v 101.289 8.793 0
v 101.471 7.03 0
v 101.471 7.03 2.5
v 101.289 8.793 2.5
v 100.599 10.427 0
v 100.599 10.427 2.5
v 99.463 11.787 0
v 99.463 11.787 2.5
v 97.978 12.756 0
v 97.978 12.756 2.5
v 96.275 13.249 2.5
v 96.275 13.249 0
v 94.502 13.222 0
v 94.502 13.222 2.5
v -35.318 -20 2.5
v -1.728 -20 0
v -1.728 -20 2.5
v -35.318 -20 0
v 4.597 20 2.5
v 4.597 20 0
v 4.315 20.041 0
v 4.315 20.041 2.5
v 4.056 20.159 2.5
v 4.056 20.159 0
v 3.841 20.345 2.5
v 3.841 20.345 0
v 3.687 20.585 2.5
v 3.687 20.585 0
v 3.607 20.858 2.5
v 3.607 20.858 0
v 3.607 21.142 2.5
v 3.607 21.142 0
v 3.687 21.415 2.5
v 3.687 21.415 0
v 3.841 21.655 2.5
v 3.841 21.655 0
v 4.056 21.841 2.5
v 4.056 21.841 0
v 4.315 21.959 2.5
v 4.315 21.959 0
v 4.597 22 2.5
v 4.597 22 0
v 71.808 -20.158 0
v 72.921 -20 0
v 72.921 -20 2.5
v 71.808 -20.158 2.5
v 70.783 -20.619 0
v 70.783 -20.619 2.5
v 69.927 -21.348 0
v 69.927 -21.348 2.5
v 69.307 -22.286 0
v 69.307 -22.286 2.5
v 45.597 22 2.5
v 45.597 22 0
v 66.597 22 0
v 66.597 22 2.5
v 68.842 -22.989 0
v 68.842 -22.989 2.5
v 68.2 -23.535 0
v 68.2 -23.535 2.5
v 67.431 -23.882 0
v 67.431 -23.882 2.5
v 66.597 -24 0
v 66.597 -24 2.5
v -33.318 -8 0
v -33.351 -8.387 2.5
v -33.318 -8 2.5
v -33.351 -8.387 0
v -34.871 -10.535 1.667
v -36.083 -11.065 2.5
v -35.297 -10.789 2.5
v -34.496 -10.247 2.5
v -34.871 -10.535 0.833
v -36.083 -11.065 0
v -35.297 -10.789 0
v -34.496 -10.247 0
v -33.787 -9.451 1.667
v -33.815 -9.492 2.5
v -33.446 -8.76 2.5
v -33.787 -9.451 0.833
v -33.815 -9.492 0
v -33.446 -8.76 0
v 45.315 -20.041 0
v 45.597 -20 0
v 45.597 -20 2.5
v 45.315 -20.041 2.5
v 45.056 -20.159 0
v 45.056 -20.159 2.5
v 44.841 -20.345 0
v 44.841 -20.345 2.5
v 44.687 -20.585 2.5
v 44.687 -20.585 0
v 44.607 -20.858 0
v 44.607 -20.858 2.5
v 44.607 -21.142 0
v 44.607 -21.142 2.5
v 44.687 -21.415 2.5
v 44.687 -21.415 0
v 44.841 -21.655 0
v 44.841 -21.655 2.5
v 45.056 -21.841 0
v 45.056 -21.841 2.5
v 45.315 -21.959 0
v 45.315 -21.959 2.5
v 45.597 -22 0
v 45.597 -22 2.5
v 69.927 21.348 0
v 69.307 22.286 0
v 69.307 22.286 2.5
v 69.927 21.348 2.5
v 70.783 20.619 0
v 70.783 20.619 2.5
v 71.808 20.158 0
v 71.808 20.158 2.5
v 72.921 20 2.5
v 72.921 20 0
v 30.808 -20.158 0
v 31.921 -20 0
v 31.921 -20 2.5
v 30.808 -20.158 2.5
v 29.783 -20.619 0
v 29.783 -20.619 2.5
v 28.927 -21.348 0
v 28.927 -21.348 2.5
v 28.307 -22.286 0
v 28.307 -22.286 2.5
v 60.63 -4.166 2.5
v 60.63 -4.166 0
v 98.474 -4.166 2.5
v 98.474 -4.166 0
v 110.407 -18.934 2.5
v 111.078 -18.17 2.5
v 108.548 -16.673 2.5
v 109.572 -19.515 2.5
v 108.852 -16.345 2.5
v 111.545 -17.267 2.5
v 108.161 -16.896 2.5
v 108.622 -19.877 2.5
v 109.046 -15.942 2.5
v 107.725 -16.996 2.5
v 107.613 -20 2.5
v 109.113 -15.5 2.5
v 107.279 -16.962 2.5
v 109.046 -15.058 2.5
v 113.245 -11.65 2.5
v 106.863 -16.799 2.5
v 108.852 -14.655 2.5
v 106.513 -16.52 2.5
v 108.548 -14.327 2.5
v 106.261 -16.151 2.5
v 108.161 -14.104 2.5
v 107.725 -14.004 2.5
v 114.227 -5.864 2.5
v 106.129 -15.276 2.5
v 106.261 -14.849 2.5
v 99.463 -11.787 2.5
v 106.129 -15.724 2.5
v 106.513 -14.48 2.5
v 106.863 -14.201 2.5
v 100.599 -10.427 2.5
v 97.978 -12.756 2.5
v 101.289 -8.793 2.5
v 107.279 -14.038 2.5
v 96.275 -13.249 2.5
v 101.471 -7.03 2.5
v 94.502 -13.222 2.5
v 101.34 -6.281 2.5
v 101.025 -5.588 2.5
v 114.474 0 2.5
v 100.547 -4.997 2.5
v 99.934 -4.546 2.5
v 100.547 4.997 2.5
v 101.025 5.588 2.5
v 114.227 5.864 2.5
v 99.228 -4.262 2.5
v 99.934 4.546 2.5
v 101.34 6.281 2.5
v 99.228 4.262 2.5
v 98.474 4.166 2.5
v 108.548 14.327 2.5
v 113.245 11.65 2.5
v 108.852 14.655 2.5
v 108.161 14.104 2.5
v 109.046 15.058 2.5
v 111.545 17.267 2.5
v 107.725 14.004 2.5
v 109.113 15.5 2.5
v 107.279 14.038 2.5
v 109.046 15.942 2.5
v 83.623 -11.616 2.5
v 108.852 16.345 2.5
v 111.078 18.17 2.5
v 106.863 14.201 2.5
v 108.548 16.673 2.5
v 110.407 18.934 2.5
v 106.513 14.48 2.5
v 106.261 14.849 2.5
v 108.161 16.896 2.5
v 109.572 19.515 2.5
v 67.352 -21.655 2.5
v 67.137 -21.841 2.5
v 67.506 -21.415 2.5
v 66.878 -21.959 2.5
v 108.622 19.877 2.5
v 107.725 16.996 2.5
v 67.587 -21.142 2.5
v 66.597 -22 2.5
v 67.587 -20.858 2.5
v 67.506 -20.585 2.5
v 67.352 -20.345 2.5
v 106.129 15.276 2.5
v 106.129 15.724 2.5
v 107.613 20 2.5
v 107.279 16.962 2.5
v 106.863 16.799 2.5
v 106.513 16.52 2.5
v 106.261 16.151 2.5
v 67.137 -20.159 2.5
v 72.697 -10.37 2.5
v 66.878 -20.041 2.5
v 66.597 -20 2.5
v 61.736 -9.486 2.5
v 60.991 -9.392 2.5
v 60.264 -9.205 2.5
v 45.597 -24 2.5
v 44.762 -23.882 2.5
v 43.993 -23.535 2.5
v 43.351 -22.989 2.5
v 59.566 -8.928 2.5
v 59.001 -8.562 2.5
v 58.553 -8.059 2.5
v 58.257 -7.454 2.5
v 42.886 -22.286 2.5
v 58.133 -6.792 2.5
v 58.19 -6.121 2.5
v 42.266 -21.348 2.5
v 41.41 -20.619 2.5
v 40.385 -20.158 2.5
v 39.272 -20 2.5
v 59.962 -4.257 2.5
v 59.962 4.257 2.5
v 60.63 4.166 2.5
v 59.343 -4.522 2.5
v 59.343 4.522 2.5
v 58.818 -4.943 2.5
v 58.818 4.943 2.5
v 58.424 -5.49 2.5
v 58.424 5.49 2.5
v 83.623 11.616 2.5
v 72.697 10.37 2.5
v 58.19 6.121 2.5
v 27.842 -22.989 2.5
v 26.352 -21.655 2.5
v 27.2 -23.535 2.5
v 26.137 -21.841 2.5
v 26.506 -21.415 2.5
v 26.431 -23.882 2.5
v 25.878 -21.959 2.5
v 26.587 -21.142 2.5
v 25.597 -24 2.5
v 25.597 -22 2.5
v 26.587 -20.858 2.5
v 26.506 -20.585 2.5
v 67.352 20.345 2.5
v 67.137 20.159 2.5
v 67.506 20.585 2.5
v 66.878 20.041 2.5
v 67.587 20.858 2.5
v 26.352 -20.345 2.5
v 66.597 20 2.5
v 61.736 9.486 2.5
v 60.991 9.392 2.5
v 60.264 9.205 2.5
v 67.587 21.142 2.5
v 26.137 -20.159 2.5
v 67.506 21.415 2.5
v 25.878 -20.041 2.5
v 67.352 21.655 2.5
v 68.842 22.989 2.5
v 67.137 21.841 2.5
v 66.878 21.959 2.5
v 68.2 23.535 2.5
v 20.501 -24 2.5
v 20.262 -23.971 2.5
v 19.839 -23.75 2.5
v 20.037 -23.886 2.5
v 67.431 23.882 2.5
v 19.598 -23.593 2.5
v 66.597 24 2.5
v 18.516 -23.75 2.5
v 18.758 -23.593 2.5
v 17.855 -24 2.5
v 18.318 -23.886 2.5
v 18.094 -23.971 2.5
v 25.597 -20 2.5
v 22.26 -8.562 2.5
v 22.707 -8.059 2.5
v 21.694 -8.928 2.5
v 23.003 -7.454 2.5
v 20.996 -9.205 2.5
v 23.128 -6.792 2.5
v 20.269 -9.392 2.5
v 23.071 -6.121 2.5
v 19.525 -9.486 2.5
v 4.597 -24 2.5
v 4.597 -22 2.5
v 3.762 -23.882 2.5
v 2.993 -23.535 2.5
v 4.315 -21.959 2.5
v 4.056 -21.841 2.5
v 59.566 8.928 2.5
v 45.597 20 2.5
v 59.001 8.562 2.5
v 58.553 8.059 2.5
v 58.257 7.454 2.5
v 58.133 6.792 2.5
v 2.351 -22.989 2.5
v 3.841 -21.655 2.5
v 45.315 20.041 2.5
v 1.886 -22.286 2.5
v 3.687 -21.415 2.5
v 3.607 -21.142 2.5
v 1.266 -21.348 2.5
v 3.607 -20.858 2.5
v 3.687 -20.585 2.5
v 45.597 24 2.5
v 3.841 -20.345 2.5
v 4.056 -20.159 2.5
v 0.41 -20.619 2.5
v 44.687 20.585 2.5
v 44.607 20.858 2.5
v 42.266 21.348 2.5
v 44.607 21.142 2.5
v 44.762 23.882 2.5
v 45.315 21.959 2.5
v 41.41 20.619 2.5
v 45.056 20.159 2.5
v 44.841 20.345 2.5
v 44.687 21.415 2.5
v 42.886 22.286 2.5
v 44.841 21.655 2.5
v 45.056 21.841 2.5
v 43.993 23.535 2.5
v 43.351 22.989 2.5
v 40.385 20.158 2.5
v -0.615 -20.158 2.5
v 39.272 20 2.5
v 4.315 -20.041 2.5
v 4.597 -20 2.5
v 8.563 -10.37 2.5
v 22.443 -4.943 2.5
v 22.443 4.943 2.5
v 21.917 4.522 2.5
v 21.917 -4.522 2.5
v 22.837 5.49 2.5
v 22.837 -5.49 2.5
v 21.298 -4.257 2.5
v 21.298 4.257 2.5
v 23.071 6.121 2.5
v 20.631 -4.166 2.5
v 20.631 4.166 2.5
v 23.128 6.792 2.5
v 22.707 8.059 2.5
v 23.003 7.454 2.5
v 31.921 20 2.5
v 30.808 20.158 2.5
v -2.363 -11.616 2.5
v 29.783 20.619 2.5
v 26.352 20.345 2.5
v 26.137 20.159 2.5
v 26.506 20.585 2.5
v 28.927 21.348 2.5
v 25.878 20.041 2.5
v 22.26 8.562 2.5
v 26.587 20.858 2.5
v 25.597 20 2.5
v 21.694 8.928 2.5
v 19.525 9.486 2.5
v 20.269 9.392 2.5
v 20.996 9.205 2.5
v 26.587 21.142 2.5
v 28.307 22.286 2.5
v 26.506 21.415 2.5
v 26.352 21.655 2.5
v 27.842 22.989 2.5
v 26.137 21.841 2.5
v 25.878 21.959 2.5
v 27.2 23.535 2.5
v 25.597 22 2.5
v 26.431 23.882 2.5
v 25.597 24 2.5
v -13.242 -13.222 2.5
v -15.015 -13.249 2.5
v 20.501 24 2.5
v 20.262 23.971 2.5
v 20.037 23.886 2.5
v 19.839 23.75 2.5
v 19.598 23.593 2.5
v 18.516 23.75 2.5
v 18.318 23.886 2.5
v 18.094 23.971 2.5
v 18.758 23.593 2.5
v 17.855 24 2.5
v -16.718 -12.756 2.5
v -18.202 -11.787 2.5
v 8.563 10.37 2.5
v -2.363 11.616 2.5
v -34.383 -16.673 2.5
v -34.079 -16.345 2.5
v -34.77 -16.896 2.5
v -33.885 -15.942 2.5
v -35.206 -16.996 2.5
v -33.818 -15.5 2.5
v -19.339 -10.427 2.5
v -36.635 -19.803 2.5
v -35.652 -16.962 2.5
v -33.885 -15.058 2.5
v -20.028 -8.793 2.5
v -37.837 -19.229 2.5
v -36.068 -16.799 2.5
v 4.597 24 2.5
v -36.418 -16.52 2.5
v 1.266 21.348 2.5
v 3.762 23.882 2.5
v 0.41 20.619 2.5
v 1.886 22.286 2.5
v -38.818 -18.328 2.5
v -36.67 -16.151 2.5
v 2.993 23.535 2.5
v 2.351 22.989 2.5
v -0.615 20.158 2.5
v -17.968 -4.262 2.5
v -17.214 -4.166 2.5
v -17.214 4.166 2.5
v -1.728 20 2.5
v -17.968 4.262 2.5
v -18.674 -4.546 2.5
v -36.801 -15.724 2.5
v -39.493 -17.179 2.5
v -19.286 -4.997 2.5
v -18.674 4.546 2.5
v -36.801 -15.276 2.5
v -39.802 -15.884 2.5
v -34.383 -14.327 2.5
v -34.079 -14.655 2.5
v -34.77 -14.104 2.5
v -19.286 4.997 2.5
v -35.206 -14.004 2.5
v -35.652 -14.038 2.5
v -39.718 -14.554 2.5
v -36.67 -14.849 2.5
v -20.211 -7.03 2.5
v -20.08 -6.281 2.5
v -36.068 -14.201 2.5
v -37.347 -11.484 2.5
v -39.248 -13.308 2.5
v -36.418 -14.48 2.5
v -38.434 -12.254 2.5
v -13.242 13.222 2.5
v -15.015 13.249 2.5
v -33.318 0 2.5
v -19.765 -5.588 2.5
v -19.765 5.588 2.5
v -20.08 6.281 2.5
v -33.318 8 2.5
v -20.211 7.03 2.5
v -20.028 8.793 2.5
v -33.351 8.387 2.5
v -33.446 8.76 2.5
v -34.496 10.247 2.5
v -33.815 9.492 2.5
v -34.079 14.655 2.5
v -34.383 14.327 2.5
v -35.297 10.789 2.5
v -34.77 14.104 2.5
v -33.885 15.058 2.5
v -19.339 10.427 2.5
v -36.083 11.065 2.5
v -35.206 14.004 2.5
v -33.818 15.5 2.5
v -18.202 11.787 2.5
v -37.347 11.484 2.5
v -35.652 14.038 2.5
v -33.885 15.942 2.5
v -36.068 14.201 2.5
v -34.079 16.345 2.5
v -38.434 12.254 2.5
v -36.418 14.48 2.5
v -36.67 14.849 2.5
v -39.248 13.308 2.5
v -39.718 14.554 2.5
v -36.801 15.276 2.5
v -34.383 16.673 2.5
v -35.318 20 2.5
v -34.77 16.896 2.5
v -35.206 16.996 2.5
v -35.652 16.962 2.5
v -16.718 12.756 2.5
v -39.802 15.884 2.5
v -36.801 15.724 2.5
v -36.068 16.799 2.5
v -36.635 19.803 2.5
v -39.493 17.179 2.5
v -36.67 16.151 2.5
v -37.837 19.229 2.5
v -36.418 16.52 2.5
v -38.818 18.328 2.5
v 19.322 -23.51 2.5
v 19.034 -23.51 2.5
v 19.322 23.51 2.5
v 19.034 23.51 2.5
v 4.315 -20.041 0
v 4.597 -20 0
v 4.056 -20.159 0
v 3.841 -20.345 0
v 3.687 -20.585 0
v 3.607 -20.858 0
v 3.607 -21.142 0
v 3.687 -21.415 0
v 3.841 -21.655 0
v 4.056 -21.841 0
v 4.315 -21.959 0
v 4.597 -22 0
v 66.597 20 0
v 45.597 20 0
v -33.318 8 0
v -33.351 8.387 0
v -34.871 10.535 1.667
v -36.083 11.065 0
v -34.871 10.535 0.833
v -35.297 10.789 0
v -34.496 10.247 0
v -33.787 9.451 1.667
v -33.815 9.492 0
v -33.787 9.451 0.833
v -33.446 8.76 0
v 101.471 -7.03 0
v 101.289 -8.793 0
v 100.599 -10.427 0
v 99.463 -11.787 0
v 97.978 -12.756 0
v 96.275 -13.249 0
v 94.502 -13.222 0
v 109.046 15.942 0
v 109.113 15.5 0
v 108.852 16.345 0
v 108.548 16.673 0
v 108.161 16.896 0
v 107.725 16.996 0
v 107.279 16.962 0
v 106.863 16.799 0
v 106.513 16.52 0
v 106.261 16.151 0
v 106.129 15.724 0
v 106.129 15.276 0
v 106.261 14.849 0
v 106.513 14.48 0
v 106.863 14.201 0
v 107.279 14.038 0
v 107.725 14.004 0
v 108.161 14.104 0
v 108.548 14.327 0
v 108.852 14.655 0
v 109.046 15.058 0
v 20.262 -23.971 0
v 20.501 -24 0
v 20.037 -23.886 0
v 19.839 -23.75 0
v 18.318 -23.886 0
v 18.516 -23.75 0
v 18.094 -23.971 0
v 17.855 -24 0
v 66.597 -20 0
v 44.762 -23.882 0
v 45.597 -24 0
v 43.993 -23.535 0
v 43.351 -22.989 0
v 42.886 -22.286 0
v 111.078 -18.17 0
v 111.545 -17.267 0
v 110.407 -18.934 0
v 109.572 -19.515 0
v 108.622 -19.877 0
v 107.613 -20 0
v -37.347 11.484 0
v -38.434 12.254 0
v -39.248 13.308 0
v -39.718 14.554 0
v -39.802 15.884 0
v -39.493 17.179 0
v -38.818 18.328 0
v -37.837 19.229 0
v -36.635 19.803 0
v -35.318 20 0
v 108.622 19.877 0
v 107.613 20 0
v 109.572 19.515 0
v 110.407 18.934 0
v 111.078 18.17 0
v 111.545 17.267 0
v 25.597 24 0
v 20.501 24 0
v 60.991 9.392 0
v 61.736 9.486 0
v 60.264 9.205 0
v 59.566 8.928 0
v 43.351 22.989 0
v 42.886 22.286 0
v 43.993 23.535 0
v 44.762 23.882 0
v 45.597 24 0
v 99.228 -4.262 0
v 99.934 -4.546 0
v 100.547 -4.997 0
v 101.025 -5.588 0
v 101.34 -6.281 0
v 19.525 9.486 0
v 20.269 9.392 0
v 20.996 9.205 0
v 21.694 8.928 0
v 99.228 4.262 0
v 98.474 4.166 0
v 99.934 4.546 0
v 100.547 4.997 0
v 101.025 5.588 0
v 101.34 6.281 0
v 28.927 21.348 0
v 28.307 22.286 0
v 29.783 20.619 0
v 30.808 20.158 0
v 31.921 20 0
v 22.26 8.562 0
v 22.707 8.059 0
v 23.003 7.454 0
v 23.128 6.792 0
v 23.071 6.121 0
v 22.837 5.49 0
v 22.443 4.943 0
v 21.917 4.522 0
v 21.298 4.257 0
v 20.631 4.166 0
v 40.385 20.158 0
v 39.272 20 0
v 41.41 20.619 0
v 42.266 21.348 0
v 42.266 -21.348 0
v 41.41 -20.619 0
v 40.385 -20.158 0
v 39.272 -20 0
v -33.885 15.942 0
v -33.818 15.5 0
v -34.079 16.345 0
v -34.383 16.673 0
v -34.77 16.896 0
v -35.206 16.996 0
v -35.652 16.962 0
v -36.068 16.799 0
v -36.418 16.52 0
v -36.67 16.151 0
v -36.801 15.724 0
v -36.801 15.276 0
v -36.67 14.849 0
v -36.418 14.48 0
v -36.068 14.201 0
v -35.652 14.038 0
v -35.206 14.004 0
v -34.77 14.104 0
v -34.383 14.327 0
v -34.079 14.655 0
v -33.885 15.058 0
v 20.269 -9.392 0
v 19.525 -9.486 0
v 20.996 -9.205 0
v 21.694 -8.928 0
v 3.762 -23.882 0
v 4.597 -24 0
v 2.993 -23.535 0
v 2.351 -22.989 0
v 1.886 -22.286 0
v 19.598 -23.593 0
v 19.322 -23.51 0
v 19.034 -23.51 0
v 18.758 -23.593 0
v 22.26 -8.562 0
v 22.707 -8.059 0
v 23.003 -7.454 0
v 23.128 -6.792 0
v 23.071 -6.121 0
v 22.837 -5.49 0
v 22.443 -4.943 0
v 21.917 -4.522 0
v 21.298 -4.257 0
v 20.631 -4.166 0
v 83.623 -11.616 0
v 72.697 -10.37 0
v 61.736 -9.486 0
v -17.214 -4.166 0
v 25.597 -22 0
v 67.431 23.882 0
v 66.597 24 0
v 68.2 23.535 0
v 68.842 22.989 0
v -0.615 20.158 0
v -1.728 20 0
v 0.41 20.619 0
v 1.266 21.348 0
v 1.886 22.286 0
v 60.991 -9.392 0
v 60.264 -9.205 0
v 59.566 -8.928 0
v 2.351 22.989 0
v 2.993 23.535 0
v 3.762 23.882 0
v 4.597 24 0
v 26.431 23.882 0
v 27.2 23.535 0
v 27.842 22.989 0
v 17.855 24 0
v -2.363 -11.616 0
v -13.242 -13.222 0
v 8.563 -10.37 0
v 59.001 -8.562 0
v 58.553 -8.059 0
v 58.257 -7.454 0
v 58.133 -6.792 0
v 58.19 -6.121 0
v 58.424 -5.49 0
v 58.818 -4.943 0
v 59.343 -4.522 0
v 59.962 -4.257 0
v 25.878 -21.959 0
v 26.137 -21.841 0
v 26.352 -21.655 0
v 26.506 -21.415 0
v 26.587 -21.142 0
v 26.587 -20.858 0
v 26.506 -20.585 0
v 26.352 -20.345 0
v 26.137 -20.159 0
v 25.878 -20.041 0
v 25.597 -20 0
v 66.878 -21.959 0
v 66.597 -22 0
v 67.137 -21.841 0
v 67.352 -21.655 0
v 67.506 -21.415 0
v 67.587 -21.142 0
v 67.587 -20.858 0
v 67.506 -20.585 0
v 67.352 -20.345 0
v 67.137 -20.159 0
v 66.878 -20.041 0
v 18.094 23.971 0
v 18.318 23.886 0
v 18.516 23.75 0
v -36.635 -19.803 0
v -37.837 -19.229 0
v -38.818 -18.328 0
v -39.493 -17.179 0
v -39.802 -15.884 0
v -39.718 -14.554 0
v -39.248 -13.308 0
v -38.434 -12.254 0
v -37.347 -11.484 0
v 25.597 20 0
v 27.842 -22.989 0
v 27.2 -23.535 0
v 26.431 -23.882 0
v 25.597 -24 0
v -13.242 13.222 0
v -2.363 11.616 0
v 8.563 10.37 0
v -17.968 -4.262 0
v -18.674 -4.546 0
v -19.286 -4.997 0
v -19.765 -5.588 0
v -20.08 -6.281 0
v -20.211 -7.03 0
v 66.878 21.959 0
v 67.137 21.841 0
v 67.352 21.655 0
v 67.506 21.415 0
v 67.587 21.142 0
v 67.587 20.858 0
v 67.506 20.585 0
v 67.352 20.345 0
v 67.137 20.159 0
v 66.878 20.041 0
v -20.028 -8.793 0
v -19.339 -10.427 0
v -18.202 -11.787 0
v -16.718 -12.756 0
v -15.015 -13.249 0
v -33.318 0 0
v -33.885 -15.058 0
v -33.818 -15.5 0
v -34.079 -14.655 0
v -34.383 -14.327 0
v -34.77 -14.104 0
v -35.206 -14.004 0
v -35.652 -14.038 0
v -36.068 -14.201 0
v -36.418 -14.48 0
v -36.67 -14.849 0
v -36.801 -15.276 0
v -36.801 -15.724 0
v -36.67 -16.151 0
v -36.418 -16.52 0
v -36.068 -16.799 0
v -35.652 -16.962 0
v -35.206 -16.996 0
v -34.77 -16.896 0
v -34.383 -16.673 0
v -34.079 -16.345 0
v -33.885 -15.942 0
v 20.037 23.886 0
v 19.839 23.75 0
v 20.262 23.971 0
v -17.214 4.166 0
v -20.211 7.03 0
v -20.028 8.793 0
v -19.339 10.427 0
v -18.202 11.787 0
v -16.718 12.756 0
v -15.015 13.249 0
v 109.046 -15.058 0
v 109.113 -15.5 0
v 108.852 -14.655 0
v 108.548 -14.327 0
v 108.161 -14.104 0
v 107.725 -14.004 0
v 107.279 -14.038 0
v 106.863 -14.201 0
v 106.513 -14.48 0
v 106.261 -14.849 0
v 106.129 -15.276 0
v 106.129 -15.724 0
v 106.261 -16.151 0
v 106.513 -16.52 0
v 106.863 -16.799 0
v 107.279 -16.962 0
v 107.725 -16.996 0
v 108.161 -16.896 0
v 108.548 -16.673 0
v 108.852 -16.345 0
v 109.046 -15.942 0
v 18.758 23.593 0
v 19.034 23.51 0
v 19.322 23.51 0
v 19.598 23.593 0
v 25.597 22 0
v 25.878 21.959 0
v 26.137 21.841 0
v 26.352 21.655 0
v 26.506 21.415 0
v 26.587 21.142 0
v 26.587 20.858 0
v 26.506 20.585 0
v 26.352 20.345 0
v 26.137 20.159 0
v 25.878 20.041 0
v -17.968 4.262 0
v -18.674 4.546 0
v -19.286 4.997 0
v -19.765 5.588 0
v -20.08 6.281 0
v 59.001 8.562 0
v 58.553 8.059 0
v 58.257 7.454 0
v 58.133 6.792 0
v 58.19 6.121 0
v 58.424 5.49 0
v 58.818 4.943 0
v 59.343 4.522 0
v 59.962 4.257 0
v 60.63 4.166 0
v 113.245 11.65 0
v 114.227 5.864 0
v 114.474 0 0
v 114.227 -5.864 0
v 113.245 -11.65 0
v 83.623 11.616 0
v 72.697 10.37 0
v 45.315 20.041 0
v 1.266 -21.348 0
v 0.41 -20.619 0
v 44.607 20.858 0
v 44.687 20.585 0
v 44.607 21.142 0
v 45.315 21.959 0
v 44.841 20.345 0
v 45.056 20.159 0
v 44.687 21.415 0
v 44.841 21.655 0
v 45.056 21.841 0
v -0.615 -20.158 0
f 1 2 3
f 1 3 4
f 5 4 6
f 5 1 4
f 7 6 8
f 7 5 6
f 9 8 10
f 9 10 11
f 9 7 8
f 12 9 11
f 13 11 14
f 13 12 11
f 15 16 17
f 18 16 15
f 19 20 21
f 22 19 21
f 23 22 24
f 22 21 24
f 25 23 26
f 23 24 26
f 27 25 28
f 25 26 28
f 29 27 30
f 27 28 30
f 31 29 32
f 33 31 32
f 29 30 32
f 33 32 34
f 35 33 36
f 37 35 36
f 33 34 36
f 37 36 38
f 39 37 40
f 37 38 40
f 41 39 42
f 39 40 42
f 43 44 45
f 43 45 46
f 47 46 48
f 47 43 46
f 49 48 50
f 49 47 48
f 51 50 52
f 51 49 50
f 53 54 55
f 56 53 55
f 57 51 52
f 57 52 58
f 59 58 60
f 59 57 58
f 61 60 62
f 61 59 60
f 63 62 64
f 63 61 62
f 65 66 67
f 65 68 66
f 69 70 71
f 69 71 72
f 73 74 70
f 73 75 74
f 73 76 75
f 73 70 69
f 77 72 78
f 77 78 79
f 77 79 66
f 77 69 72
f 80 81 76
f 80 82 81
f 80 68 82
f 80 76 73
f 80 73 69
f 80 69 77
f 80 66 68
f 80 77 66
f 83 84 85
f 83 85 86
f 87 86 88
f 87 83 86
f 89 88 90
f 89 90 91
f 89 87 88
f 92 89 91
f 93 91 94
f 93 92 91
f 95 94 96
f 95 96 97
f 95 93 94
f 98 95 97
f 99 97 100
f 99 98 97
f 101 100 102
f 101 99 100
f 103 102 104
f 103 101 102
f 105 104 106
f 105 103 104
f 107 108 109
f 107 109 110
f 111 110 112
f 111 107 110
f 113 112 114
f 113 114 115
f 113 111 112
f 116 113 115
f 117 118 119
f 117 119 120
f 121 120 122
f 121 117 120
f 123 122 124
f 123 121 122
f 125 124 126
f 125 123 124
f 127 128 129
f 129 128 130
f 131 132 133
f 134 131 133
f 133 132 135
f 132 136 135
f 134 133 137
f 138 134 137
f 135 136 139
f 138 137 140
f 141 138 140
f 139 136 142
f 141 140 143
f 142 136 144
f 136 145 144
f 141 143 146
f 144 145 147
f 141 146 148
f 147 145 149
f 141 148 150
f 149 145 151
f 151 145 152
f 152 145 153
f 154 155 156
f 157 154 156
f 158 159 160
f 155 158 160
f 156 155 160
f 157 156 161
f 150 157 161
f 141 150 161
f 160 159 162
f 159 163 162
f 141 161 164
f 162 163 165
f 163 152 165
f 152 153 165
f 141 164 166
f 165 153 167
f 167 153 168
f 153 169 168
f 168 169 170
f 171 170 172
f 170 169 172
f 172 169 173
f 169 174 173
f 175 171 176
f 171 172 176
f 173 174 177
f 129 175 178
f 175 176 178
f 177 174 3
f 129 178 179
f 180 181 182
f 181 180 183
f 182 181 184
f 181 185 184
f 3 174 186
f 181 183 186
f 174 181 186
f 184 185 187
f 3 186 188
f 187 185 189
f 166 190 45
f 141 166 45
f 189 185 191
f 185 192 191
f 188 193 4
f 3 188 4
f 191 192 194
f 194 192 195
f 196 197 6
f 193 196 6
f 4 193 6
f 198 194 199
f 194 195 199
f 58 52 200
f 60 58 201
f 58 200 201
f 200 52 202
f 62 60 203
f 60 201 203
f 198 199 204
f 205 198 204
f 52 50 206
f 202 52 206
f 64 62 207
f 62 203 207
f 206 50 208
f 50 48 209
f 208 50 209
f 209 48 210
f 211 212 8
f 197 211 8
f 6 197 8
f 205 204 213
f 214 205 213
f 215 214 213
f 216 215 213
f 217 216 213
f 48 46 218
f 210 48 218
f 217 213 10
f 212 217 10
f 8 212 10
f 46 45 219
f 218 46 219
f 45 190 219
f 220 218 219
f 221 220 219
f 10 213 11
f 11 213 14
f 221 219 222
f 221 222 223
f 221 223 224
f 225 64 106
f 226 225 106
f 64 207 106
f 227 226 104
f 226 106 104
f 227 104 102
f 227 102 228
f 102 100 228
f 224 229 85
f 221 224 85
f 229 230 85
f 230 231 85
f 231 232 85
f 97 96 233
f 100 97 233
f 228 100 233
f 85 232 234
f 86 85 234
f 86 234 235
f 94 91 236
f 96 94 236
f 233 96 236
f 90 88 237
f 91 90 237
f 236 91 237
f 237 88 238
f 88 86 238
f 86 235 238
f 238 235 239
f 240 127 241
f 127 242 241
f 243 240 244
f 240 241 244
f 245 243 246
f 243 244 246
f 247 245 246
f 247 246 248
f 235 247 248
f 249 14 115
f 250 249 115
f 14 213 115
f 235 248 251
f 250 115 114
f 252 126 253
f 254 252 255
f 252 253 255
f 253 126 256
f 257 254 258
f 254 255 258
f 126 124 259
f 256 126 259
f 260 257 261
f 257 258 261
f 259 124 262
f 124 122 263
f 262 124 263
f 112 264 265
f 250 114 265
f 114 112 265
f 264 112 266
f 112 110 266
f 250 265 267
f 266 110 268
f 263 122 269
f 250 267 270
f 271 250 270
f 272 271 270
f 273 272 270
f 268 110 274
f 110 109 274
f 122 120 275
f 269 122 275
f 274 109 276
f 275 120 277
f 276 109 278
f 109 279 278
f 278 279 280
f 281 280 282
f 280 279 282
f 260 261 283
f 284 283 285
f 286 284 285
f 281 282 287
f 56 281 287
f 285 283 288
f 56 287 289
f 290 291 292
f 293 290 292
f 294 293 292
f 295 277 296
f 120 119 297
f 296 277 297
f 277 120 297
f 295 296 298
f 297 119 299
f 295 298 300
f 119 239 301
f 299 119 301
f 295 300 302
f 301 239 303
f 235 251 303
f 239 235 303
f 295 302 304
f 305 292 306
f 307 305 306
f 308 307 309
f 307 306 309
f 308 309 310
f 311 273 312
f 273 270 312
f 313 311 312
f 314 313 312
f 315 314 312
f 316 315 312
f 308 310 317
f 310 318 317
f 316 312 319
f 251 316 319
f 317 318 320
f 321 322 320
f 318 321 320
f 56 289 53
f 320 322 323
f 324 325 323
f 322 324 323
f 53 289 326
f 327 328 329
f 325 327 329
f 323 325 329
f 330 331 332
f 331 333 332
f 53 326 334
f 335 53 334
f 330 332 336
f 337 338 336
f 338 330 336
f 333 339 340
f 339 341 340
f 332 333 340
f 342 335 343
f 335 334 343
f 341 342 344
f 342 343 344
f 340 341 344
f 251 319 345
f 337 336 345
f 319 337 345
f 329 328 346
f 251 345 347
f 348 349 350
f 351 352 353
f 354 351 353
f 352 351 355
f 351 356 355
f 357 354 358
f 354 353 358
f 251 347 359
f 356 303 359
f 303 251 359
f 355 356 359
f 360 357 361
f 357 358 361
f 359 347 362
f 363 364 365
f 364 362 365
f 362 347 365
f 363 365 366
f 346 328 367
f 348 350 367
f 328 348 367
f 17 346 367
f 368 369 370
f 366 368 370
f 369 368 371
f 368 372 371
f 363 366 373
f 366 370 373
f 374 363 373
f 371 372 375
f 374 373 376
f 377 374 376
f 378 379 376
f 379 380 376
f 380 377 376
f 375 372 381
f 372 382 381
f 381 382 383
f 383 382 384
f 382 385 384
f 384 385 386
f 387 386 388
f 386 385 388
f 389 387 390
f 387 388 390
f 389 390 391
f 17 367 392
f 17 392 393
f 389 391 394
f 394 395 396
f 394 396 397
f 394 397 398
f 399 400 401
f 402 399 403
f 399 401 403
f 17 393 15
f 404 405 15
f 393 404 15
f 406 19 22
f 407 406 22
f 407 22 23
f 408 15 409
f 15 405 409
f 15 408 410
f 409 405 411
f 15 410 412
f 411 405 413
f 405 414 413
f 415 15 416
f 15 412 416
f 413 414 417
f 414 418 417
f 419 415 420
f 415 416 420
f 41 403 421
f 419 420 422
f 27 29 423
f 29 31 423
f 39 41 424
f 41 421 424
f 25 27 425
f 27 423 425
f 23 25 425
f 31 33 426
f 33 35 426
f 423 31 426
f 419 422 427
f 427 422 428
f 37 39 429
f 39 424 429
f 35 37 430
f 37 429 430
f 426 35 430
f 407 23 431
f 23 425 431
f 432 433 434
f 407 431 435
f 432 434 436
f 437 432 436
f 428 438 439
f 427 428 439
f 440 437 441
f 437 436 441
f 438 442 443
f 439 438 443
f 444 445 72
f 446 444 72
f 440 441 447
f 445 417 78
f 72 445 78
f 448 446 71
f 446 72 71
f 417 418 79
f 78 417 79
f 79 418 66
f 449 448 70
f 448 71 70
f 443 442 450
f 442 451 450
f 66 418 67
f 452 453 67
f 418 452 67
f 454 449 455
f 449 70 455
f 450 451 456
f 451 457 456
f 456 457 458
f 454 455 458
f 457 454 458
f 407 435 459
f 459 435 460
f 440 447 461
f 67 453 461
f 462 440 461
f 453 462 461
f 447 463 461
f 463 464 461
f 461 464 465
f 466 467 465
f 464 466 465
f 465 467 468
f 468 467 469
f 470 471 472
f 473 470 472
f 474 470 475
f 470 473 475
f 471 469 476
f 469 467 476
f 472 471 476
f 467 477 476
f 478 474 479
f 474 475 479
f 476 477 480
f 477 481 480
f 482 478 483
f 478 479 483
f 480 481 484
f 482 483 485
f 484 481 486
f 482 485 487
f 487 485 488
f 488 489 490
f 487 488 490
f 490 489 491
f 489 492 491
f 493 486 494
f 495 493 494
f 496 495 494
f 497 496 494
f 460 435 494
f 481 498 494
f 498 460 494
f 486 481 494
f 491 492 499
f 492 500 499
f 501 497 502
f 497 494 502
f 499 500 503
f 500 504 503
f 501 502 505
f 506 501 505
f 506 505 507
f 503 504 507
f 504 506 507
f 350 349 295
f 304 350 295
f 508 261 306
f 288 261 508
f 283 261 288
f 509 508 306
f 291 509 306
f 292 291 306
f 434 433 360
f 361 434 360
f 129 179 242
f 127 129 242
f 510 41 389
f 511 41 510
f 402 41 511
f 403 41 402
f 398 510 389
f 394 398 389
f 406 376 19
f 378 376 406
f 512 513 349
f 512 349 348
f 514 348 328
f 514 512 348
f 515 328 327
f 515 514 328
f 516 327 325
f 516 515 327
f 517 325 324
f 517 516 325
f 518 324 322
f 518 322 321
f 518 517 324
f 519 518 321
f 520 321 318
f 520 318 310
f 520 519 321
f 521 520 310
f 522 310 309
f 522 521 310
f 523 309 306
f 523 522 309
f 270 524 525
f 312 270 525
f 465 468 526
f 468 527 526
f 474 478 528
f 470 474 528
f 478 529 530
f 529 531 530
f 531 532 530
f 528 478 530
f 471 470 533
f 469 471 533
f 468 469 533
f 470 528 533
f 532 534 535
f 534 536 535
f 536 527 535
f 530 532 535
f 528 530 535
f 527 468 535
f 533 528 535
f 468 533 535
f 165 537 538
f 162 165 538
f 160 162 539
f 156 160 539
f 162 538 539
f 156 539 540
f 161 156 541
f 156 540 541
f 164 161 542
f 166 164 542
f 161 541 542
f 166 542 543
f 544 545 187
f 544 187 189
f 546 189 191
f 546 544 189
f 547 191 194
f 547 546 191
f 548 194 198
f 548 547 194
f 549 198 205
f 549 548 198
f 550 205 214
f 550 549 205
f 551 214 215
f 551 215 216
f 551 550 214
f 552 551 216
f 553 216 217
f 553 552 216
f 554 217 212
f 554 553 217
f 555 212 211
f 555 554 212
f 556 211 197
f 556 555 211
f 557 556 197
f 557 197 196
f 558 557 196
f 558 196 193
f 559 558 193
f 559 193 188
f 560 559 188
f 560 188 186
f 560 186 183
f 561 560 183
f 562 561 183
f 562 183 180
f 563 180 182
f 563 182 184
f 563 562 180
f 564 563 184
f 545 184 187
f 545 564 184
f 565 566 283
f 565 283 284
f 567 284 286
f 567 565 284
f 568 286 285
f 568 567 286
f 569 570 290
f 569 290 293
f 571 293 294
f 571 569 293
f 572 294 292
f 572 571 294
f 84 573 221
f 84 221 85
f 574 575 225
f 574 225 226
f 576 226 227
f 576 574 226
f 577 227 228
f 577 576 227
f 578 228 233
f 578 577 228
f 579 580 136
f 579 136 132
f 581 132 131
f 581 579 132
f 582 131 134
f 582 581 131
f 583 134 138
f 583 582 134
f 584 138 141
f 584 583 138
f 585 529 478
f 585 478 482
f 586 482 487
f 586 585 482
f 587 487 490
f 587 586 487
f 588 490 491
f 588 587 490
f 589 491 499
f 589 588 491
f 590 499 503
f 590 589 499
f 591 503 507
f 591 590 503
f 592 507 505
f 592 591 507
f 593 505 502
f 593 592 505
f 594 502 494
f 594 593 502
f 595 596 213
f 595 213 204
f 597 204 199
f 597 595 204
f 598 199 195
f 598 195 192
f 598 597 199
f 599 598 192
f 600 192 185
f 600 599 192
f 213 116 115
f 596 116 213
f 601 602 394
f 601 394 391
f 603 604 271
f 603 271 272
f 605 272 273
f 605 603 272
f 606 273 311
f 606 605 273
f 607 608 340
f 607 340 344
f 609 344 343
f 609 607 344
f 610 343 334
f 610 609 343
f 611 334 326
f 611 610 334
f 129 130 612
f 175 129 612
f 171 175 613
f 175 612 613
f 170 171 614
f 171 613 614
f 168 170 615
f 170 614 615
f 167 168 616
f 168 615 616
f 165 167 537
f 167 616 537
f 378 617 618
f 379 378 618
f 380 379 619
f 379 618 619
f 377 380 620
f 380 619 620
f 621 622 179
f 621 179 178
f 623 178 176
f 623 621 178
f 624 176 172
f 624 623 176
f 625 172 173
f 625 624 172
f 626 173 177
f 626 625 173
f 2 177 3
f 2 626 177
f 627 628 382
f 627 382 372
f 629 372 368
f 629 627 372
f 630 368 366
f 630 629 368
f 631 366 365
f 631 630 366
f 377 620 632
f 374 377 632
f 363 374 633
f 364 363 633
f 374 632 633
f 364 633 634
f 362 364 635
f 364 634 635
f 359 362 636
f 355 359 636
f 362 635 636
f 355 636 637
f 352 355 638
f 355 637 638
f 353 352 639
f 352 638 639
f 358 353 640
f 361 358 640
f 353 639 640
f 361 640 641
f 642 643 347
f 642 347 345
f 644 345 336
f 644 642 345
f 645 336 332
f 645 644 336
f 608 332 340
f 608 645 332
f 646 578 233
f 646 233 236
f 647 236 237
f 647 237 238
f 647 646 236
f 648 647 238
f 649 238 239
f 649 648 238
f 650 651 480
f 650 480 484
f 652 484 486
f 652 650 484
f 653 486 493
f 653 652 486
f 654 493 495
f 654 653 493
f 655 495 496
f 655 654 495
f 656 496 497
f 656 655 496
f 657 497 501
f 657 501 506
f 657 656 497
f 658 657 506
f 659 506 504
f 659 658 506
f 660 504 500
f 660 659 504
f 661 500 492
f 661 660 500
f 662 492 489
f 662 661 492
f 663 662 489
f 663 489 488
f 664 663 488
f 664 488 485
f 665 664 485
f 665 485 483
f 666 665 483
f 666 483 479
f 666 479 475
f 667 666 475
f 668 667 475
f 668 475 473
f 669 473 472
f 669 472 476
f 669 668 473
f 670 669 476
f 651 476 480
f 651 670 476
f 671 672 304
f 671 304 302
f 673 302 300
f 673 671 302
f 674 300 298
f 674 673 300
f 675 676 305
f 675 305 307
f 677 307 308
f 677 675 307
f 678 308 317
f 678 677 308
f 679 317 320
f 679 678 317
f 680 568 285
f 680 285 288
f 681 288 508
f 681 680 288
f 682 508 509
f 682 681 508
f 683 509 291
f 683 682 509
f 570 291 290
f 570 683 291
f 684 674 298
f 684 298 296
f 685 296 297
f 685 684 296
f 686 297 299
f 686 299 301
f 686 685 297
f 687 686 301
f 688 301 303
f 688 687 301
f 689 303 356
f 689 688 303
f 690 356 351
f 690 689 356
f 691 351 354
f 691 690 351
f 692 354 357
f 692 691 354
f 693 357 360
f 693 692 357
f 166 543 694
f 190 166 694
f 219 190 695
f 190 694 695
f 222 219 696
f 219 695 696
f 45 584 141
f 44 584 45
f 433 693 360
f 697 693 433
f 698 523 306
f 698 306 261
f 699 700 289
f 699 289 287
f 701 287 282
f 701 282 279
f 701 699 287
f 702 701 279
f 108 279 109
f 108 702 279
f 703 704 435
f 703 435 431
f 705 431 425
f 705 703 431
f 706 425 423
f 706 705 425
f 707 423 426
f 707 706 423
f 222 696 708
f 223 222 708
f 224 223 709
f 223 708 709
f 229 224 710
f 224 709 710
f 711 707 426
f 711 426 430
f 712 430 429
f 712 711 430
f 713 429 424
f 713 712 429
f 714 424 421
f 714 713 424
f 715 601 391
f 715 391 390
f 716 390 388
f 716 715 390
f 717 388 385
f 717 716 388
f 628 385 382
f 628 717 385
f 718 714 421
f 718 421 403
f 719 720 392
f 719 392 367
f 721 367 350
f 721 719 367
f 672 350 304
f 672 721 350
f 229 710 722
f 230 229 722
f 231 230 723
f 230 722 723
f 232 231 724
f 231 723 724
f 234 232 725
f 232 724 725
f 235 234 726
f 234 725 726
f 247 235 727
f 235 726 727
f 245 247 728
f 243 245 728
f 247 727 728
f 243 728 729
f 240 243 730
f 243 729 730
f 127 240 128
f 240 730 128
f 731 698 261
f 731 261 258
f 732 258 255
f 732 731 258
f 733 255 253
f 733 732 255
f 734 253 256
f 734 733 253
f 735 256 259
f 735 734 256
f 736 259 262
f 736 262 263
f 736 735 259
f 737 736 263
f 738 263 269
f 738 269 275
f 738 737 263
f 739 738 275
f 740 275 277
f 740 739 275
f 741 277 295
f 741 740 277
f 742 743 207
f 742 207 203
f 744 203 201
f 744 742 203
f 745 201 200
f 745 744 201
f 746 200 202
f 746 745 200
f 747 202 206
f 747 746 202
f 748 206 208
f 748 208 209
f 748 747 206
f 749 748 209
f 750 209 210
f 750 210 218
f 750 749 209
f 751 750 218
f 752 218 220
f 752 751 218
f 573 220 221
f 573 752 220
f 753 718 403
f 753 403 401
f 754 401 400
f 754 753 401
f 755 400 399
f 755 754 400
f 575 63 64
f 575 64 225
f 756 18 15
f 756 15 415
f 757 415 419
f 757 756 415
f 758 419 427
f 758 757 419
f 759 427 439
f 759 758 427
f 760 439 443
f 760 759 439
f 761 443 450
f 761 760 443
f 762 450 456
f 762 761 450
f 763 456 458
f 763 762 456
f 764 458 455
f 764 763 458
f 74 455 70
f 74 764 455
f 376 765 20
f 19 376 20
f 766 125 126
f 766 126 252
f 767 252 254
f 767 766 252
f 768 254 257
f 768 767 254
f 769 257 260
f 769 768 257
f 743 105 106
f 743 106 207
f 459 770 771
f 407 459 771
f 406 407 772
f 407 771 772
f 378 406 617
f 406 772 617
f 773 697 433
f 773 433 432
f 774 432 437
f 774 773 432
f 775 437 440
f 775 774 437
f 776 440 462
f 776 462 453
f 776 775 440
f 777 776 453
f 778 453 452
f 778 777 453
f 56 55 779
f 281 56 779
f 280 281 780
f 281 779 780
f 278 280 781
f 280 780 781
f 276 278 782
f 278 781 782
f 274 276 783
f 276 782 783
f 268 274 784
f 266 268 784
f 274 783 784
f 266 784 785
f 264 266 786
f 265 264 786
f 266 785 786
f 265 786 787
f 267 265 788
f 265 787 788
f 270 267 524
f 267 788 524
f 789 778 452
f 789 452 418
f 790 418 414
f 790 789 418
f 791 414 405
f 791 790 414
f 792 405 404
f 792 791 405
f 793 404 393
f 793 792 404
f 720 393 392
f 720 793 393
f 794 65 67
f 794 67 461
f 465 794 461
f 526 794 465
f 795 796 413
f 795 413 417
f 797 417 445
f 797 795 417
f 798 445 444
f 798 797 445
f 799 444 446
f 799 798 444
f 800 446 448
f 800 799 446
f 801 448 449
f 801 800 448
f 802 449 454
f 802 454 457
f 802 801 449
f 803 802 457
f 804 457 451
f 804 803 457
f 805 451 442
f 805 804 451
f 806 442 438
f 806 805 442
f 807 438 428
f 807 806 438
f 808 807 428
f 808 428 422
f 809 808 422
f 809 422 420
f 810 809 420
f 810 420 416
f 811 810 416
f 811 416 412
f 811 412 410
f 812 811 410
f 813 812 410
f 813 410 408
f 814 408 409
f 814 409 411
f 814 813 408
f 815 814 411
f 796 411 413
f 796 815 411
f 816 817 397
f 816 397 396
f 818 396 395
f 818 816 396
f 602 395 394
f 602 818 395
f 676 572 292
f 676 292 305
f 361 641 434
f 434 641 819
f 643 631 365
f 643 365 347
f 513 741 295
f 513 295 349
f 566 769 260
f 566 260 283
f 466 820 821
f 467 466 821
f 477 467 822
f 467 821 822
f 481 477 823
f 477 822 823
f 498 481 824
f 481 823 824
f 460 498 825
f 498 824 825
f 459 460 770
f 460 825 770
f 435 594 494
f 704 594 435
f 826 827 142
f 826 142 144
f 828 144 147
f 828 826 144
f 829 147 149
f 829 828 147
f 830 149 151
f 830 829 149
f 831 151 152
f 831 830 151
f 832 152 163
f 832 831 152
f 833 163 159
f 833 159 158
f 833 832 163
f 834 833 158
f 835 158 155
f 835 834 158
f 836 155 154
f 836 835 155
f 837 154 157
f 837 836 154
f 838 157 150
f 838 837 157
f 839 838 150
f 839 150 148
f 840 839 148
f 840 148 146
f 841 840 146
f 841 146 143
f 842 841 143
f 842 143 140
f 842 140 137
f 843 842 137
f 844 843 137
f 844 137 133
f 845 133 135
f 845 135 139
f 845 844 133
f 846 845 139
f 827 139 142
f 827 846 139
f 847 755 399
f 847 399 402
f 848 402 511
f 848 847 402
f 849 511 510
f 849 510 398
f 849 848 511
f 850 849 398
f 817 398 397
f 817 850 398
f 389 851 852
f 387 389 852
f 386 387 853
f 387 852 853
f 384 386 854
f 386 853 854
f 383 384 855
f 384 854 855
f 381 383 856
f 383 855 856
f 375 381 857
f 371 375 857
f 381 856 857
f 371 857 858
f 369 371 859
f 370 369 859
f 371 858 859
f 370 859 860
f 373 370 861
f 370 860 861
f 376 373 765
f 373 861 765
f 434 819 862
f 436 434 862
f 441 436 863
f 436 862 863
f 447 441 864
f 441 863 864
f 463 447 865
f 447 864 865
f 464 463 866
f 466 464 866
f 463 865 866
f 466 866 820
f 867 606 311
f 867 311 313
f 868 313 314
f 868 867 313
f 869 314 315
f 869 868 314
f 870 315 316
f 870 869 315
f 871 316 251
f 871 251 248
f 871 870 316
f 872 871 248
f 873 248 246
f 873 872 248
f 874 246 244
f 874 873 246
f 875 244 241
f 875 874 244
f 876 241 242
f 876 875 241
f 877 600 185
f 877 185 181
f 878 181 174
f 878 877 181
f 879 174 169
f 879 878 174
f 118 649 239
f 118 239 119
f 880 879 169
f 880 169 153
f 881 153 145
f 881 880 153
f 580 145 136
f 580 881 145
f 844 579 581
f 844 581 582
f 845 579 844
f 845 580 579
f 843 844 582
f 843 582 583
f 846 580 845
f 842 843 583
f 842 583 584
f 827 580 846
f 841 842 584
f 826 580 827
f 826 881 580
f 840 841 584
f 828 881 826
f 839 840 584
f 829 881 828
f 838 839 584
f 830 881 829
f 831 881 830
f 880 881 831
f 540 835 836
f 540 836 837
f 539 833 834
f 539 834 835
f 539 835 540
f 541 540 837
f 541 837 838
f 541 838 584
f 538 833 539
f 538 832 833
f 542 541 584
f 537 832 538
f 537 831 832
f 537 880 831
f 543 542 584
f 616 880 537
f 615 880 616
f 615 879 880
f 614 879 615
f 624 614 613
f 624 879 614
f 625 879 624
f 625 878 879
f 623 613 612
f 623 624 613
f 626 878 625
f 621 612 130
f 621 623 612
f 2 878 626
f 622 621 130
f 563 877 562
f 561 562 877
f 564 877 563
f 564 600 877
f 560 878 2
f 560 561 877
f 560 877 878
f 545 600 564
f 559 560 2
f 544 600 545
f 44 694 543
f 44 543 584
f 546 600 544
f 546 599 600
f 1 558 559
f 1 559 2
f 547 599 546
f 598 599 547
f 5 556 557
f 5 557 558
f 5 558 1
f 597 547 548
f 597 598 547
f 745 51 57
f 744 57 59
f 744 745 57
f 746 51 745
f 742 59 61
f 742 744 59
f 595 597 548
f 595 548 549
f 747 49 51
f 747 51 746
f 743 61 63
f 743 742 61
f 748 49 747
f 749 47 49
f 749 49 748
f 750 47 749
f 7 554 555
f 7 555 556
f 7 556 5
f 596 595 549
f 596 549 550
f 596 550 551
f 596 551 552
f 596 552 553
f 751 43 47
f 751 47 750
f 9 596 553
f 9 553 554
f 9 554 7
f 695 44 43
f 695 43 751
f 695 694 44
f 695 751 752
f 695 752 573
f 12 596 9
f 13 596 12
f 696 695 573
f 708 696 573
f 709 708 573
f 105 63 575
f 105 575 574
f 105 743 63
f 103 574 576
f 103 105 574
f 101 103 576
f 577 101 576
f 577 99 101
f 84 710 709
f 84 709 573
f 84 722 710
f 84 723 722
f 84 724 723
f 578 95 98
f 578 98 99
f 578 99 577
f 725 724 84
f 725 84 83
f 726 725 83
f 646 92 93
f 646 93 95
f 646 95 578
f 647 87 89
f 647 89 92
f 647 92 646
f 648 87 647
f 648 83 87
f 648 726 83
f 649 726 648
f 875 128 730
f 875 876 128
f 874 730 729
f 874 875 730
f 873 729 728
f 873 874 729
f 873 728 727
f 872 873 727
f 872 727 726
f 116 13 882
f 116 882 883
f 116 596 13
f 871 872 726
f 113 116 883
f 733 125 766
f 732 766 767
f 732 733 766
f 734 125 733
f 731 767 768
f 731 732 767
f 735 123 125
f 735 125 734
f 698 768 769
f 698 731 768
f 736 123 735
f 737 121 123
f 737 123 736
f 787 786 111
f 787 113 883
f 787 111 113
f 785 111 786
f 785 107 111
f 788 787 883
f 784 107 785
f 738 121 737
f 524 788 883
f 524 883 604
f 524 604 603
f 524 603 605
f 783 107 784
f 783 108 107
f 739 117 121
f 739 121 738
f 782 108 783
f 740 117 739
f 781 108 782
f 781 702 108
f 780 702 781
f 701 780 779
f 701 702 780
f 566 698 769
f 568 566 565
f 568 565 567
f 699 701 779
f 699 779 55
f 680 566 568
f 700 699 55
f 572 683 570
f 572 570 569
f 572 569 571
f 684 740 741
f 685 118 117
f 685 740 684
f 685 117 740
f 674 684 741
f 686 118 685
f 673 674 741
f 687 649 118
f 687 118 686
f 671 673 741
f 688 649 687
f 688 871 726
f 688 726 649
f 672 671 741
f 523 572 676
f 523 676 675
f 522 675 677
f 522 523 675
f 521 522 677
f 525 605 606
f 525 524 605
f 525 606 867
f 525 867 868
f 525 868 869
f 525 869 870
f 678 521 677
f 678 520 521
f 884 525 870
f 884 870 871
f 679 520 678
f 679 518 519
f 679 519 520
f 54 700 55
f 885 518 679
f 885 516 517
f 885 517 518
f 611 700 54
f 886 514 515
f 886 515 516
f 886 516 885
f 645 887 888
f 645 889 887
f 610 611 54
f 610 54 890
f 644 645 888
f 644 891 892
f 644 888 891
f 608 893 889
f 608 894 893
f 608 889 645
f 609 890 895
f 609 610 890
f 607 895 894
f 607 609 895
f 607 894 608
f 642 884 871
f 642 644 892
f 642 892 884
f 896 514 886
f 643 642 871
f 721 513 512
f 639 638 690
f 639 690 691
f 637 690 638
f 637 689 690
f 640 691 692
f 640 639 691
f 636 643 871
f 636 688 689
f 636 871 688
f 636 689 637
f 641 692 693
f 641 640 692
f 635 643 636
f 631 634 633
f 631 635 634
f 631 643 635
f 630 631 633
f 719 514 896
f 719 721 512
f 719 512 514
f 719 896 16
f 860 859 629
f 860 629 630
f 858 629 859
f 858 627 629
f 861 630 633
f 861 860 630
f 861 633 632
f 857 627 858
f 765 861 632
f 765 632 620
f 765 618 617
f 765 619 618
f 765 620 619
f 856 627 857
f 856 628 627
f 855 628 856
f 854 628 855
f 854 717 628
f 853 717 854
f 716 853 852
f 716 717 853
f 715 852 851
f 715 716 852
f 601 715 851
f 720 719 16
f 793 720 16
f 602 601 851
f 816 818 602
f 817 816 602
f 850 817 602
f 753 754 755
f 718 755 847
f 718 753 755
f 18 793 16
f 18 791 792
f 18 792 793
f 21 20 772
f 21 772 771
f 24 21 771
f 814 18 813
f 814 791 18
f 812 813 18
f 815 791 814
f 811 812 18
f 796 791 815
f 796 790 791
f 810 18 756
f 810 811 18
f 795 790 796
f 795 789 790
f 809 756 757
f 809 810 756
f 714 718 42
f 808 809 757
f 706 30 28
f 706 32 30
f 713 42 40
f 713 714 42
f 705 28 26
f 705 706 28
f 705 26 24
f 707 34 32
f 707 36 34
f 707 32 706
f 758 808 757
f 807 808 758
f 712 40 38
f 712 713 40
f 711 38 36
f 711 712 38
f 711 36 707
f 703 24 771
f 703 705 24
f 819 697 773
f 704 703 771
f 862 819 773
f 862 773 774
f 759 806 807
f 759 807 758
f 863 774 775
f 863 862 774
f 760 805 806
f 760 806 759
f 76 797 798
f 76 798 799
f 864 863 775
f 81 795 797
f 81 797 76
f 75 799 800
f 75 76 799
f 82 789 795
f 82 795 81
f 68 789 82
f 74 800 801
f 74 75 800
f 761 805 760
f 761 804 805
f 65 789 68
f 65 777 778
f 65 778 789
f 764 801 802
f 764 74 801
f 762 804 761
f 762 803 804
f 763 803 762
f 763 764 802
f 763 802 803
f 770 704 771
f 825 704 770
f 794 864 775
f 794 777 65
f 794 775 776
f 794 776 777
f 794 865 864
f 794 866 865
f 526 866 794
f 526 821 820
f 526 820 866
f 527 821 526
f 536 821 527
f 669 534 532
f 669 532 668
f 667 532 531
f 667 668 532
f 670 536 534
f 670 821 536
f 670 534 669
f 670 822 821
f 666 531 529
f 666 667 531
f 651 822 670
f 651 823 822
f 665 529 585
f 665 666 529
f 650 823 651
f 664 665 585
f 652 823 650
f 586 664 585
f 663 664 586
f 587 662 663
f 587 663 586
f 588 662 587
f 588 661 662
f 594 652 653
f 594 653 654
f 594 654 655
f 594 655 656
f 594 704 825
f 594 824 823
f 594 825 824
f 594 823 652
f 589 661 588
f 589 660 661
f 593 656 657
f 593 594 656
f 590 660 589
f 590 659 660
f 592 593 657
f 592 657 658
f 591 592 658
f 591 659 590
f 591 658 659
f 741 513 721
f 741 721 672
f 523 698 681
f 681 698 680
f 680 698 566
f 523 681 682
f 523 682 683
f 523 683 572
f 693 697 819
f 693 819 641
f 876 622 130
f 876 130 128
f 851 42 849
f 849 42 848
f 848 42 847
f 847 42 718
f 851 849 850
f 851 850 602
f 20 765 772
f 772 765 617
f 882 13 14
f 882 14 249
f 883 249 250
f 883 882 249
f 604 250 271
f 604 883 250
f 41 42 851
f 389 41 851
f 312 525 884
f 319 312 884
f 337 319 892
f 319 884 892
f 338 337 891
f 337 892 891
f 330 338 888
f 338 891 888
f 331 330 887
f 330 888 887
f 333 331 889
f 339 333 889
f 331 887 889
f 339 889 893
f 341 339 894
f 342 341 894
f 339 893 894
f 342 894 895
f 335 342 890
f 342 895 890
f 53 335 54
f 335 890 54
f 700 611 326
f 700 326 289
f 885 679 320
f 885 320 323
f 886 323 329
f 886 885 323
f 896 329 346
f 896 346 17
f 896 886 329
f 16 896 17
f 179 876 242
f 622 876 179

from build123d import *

# Parameters (mm, degrees)
CROQUIS1_R              = 1.5
SALIENTE_EXTRUIR1_DEPTH = 2.5


with BuildPart() as part:
    # Croquis1 → Saliente-Extruir1 (new body)
    with BuildSketch(Plane.XY):
        with BuildLine():
            Line((-1.727869, -20), (-35.318076, -20))
            ThreePointArc((-35.318076, -20), (-39.801686502, -15.883714562), (-36.082710062, -11.065438607))
            add(Edge.make_bspline(
                [(-36.082710062, -11.065438607), (-34.968163592, -10.873261807), (-33.318075526, -9.571810644), (-33.318075526, -8.000000003)],
                knots=[0, 0, 0, 0, 1, 1, 1, 1], degree=3))
            Line((-33.318075526, -8.000000003), (-33.318076, 0))
            Line((-33.318076, 0), (-33.318075526, 7.999999997))
            add(Edge.make_bspline(
                [(-36.082710062, 11.065438607), (-34.968163592, 10.873261801), (-33.318075526, 9.571810638), (-33.318075526, 7.999999997)],
                knots=[0, 0, 0, 0, 1, 1, 1, 1], degree=3))
            ThreePointArc((-36.082710062, 11.065438607), (-39.801686502, 15.883714562), (-35.318076, 20))
            Line((-35.318076, 20), (-1.727869, 20))
            ThreePointArc((-1.727869, 20), (0.410220921, 20.619382972), (1.886162597, 22.285714256))
            ThreePointArc((1.886162597, 22.285714256), (2.993118801, 23.535462608), (4.596686131, 23.999999793))
            Line((4.596686131, 23.999999793), (17.855013131, 23.999999793))
            ThreePointArc((17.855013131, 23.999999793), (18.20856652, 23.93541414), (18.516450957, 23.749999795))
            ThreePointArc((18.516450957, 23.749999795), (19.177888957, 23.499999641), (19.839326957, 23.749999792))
            ThreePointArc((19.839326957, 23.749999792), (20.147211189, 23.935413861), (20.500764274, 23.999999414))
            Line((20.500764274, 23.999999414), (25.596686274, 23.999999414))
            ThreePointArc((25.596686274, 23.999999414), (27.200253319, 23.535462249), (28.307209321, 22.285714093))
            ThreePointArc((28.307209321, 22.285714093), (29.783150997, 20.61938281), (31.921240919, 19.999999837))
            Line((31.921240919, 19.999999837), (39.272130919, 19.999999837))
            ThreePointArc((39.272130919, 19.999999837), (41.41022084, 20.61938281), (42.886162516, 22.285714093))
            ThreePointArc((42.886162516, 22.285714093), (43.993118719, 23.535462445), (45.596686049, 23.999999631))
            Line((45.596686049, 23.999999631), (66.596686049, 23.999999631))
            ThreePointArc((66.596686049, 23.999999631), (68.20025338, 23.535462445), (69.307209583, 22.285714093))
            ThreePointArc((69.307209583, 22.285714093), (70.783151259, 20.61938281), (72.92124118, 19.999999837))
            Line((72.92124118, 19.999999837), (107.61258818, 19.999999837))
            ThreePointArc((107.61258818, 19.999999837), (110.006914096, 19.249811631), (111.545093682, 17.267494173))
            ThreePointArc((111.545093682, 17.267494173), (113.827321184, 8.772458491), (114.473968889, -7.06e-07))
            ThreePointArc((114.473968889, -7.06e-07), (113.827321261, -8.772459139), (111.545094118, -17.267494122))
            ThreePointArc((111.545094118, -17.267494122), (110.006914516, -19.249811879), (107.612588369, -20.000000175))
            Line((107.612588369, -20.000000175), (72.921241369, -20.000000175))
            ThreePointArc((72.921241369, -20.000000175), (70.783151447, -20.619383147), (69.307209771, -22.285714431))
            ThreePointArc((69.307209771, -22.285714431), (68.200253515, -23.535462843), (66.596686107, -24.000000051))
            Line((66.596686107, -24.000000051), (45.596686107, -24.000000051))
            ThreePointArc((45.596686107, -24.000000051), (43.993118827, -23.535462721), (42.886162705, -22.285714307))
            ThreePointArc((42.886162705, -22.285714307), (41.410221028, -20.619383023), (39.272131107, -20.000000051))
            Line((39.272131107, -20.000000051), (31.921241107, -20.000000051))
            ThreePointArc((31.921241107, -20.000000051), (29.783151186, -20.619383023), (28.30720951, -22.285714307))
            ThreePointArc((28.30720951, -22.285714307), (27.200253316, -23.535462648), (25.596686, -23.999999829))
            Line((25.596686, -23.999999829), (20.500764, -23.999999829))
            ThreePointArc((20.500764, -23.999999829), (20.14721061, -23.935414176), (19.839326174, -23.74999983))
            ThreePointArc((19.839326174, -23.74999983), (19.177888468, -23.50000009), (18.516450826, -23.750000001))
            ThreePointArc((18.516450826, -23.750000001), (18.20856639, -23.935414347), (17.855013, -24))
            Line((17.855013, -24), (4.596686, -24))
            ThreePointArc((4.596686, -24), (2.993118559, -23.535462771), (1.886162302, -22.285714308))
            ThreePointArc((1.886162302, -22.285714308), (0.410220761, -20.619383073), (-1.727869, -20))
        make_face()
        with Locations((107.612588, -15.5)):
            Circle(CROQUIS1_R, mode=Mode.SUBTRACT)
        with Locations((-35.318076, -15.5)):
            Circle(CROQUIS1_R, mode=Mode.SUBTRACT)
        with Locations((-35.318076, 15.5)):
            Circle(CROQUIS1_R, mode=Mode.SUBTRACT)
        with Locations((107.612588, 15.5)):
            Circle(CROQUIS1_R, mode=Mode.SUBTRACT)
        with BuildLine():
            Line((66.596686049, 19.999999775), (45.596686049, 19.999999775))
            ThreePointArc((45.596686049, 19.999999775), (44.596686049, 20.999999775), (45.596686049, 21.999999775))
            Line((45.596686049, 21.999999775), (66.596686049, 21.999999775))
            ThreePointArc((66.596686049, 21.999999775), (67.596686049, 20.999999775), (66.596686049, 19.999999775))
        make_face(mode=Mode.SUBTRACT)
        with BuildLine():
            Line((4.596686131, 21.999999938), (25.596686131, 21.999999938))
            ThreePointArc((25.596686131, 21.999999938), (26.596686131, 20.999999938), (25.596686131, 19.999999938))
            Line((25.596686131, 19.999999938), (4.596686131, 19.999999938))
            ThreePointArc((4.596686131, 19.999999938), (3.596686131, 20.999999938), (4.596686131, 21.999999938))
        make_face(mode=Mode.SUBTRACT)
        with BuildLine():
            Line((60.629579, -4.165983), (98.473924, -4.165983))
            ThreePointArc((98.473924, -4.165983), (100.546598144, -4.997118122), (101.470828647, -7.029988427))
            ThreePointArc((101.470828647, -7.029988427), (99.46254802, -11.787003007), (94.502482097, -13.222316504))
            ThreePointArc((94.502482097, -13.222316504), (78.165345659, -10.947800594), (61.735508446, -9.48632916))
            ThreePointArc((61.735508446, -9.48632916), (60.624439263, -9.309527068), (59.565908087, -8.928416245))
            ThreePointArc((59.565908087, -8.928416245), (58.189693438, -6.121044064), (60.629579, -4.165983))
        make_face(mode=Mode.SUBTRACT)
        with BuildLine():
            Line((25.596686, -20), (4.596686, -20))
            ThreePointArc((4.596686, -20), (3.596686, -21), (4.596686, -22))
            Line((4.596686, -22), (25.596686, -22))
            ThreePointArc((25.596686, -22), (26.596686, -21), (25.596686, -20))
        make_face(mode=Mode.SUBTRACT)
        with BuildLine():
            Line((66.596686107, -20.000000051), (45.596686107, -20.000000051))
            ThreePointArc((45.596686107, -20.000000051), (44.596686427, -21.000000051), (45.596686107, -22.000000051))
            Line((45.596686107, -22.000000051), (66.596686107, -22.000000051))
            ThreePointArc((66.596686107, -22.000000051), (67.596686107, -21.000000051), (66.596686107, -20.000000051))
        make_face(mode=Mode.SUBTRACT)
        with BuildLine():
            Line((20.630693, -4.165983), (-17.213652, -4.165983))
            ThreePointArc((-17.213652, -4.165983), (-19.286331958, -4.997112835), (-20.210567815, -7.029984473))
            ThreePointArc((-20.210567815, -7.029984473), (-18.202285238, -11.787004738), (-13.242211847, -13.222314))
            ThreePointArc((-13.242211847, -13.222314), (3.094925006, -10.947797585), (19.524762662, -9.486325691))
            ThreePointArc((19.524762662, -9.486325691), (20.635832812, -9.309527332), (21.694365632, -8.928419991))
            ThreePointArc((21.694365632, -8.928419991), (23.070588154, -6.121043634), (20.630693, -4.165983))
        make_face(mode=Mode.SUBTRACT)
        with BuildLine():
            Line((60.629579, 4.165983), (98.473924, 4.165983))
            ThreePointArc((98.473924, 4.165983), (100.546603429, 4.997112019), (101.470840047, 7.029982437))
            ThreePointArc((101.470840047, 7.029982437), (99.462556799, 11.787003808), (94.502482022, 13.222312881))
            ThreePointArc((94.502482022, 13.222312881), (78.165344631, 10.947798744), (61.735506549, 9.486329166))
            ThreePointArc((61.735506549, 9.486329166), (60.624437652, 9.309528853), (59.565906368, 8.928419991))
            ThreePointArc((59.565906368, 8.928419991), (58.189683846, 6.121043634), (60.629579, 4.165983))
        make_face(mode=Mode.SUBTRACT)
        with BuildLine():
            Line((20.630693, 4.165983), (-17.213652, 4.165983))
            ThreePointArc((-17.213652, 4.165983), (-19.286325559, 4.99711656), (-20.210557539, 7.029984958))
            ThreePointArc((-20.210557539, 7.029984958), (-18.202276912, 11.786999538), (-13.242210989, 13.222313035))
            ThreePointArc((-13.242210989, 13.222313035), (3.094925937, 10.947798842), (19.524763554, 9.48632916))
            ThreePointArc((19.524763554, 9.48632916), (20.635832737, 9.309527068), (21.694363913, 8.928416245))
            ThreePointArc((21.694363913, 8.928416245), (23.070578562, 6.121044064), (20.630693, 4.165983))
        make_face(mode=Mode.SUBTRACT)
    extrude(amount=SALIENTE_EXTRUIR1_DEPTH)


solid = part.part
